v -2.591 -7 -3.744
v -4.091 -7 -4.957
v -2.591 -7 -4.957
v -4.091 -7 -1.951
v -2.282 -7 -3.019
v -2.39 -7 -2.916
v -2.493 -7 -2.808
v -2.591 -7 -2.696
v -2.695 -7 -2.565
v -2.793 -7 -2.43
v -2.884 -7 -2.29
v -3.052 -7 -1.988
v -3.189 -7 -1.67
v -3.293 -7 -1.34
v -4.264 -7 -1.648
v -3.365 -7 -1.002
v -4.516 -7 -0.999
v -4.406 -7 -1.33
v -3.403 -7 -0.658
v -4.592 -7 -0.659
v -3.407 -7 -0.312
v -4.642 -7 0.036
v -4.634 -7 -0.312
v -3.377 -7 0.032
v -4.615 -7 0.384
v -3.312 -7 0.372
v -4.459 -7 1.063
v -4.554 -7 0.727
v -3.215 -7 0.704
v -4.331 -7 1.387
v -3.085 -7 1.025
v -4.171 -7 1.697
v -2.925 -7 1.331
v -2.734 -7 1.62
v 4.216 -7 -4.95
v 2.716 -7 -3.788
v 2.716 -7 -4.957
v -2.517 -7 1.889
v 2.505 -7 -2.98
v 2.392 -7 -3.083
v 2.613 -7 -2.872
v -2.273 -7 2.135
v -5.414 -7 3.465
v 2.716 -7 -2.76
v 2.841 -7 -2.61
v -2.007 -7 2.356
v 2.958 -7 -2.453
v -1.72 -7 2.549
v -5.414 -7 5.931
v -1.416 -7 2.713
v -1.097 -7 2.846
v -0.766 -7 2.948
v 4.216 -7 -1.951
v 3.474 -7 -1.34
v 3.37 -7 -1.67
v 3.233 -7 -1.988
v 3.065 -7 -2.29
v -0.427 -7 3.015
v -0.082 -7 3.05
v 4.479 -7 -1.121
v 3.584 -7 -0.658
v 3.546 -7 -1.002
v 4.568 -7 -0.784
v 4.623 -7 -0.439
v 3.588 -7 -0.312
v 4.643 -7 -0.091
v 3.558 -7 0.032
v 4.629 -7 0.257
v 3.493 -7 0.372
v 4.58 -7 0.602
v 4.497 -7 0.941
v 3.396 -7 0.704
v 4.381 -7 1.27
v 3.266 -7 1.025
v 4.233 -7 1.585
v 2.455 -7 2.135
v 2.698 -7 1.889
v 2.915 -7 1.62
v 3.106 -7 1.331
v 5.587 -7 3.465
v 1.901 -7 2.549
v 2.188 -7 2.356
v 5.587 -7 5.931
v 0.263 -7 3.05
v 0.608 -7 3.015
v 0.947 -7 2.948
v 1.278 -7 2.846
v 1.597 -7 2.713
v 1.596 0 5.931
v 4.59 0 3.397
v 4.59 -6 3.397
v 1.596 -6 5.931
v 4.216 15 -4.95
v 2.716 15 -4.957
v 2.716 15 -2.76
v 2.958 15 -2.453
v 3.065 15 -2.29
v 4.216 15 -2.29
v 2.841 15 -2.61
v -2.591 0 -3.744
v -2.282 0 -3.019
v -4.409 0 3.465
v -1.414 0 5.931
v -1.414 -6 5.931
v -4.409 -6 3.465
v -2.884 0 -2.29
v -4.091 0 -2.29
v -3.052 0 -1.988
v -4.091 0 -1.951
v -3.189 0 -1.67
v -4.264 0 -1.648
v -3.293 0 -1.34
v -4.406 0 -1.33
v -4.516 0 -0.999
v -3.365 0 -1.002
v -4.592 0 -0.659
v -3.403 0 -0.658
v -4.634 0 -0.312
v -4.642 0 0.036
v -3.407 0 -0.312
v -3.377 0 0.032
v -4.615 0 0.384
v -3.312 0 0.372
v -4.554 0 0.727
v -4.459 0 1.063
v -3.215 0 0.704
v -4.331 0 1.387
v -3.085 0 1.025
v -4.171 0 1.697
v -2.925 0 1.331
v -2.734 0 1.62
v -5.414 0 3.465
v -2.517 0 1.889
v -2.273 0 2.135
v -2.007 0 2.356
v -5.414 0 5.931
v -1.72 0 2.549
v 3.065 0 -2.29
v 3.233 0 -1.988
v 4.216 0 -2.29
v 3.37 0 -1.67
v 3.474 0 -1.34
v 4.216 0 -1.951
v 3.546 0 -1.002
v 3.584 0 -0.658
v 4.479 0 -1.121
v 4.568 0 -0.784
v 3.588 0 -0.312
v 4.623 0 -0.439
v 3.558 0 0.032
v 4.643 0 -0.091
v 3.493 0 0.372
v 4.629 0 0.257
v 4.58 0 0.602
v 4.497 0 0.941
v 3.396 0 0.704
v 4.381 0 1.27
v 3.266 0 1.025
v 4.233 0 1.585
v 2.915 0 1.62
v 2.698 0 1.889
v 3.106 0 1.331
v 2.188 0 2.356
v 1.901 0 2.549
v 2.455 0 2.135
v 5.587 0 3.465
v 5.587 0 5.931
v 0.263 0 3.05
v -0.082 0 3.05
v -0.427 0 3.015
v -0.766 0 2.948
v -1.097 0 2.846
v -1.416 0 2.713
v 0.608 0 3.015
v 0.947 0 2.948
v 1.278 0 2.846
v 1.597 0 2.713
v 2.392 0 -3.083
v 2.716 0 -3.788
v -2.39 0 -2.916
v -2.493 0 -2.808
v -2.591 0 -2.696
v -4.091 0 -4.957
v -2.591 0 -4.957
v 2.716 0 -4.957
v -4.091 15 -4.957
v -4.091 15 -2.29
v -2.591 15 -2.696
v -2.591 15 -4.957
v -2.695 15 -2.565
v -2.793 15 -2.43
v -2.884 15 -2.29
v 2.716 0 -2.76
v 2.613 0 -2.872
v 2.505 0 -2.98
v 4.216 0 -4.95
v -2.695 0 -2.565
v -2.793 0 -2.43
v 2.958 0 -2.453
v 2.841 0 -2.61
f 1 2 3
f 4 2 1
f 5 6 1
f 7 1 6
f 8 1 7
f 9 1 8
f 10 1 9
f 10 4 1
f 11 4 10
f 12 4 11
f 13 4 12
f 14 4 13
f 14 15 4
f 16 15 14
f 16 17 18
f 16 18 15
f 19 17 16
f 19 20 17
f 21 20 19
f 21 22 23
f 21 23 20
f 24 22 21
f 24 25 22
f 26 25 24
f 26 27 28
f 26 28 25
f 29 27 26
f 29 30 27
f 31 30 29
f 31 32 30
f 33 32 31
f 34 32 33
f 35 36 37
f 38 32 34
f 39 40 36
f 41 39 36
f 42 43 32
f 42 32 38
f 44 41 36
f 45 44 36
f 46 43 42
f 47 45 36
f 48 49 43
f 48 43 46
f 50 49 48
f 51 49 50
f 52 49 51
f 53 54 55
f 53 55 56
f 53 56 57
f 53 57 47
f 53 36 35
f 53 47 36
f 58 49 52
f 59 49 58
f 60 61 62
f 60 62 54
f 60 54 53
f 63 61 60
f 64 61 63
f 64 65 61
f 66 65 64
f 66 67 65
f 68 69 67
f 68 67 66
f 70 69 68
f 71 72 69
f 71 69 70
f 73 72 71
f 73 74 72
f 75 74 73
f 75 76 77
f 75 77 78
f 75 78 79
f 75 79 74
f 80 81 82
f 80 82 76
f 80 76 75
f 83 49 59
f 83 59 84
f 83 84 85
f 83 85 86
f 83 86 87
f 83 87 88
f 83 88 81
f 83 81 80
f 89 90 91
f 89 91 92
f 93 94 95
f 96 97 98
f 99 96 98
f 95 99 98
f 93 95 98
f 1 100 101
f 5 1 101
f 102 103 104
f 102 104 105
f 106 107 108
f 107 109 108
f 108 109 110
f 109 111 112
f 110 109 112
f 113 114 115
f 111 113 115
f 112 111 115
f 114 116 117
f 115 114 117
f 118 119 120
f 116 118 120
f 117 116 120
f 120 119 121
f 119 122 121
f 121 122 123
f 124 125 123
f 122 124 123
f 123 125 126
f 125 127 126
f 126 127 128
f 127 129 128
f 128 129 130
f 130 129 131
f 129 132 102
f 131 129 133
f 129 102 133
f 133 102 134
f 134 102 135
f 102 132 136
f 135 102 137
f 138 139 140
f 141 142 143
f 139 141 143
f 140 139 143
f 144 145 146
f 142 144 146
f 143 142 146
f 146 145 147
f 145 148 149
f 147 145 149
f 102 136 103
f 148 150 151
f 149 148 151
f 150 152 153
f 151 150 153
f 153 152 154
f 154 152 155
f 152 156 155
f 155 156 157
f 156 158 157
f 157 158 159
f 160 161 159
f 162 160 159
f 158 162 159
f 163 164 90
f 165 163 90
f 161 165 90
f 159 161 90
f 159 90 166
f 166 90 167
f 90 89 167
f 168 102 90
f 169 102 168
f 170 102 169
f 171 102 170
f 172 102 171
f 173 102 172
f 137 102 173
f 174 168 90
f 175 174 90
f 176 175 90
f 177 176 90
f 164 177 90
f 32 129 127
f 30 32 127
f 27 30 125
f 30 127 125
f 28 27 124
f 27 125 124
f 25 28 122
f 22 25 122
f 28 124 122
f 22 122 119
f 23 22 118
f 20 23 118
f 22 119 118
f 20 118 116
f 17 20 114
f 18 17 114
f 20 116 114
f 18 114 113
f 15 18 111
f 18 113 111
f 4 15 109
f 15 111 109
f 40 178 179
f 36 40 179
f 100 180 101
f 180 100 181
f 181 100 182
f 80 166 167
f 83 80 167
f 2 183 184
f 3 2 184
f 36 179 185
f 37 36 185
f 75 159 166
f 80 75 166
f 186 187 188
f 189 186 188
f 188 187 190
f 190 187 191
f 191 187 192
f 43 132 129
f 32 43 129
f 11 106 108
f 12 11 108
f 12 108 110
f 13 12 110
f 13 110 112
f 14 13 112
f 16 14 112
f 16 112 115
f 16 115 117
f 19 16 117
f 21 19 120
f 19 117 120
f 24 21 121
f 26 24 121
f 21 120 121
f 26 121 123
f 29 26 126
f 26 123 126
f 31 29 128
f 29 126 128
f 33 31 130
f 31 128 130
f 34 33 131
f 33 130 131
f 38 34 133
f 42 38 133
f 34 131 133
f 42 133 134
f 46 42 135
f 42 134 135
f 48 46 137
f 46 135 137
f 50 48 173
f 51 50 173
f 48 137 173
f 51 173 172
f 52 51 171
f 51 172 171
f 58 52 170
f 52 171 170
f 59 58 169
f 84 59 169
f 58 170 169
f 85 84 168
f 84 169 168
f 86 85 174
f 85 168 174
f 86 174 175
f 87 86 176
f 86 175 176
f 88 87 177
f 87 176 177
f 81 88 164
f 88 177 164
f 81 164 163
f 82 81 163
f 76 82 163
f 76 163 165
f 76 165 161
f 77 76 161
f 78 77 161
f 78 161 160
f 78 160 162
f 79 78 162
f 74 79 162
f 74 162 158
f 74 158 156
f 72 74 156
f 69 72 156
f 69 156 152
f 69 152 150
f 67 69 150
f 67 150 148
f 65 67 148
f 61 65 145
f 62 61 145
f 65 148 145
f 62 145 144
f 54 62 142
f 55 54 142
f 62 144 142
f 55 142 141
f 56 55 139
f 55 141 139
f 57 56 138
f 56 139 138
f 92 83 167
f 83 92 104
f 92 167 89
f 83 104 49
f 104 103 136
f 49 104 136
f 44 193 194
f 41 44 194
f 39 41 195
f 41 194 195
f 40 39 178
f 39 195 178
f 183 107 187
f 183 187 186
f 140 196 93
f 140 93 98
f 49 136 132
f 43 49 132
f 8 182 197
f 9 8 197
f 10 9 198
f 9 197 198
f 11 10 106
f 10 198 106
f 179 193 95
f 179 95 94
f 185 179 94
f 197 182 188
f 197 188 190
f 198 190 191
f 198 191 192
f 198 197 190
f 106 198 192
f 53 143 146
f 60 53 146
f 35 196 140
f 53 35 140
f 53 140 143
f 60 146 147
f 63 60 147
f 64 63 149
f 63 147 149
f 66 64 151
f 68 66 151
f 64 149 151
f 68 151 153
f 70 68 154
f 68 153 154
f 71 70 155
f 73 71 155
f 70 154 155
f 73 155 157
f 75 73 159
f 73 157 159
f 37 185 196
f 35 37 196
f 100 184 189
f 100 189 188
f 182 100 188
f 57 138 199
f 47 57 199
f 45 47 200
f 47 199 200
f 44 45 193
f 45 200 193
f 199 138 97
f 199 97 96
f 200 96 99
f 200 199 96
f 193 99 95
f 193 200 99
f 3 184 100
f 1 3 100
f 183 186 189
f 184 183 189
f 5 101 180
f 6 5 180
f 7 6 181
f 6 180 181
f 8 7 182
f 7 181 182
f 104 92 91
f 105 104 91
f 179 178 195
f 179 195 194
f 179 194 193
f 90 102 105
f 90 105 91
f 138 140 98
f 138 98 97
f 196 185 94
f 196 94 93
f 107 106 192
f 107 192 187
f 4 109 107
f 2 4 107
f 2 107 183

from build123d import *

# Parameters (mm, degrees)
F1_DEPTH = 7
F2_DEPTH = 6
F3_DEPTH = 15


# Not quite as in the source:
# - a feature names something its author has since deleted; it is built from what else it names


with BuildPart() as f1:
    # F0 (on Front) → F1 (new body)
    with BuildSketch(Plane.XZ):
        with BuildLine():
            Line((-4.090710345, -1.9507641112), (-3.3236176952, -1.6008211246))
            Line((-3.3236176952, -1.6008211246), (-3.3236176952, -2.2903047641))
            Line((-3.3236176952, -2.2903047641), (-2.8842022451, -2.2903047641))
            ThreePointArc((-2.8842022451, -2.2903047641), (0.0905031972, 3.0539098469), (3.0652086395, -2.2903047641))
            Line((3.0652086395, -2.2903047641), (3.4491920394, -2.2903047641))
            Line((3.4491920394, -2.2903047641), (3.4491920394, -1.6408955531))
            Line((3.4491920394, -1.6408955531), (4.2162846892, -1.9507641112))
            Line((4.2162846892, -1.9507641112), (4.4794066601, -1.1210844752))
            ThreePointArc((4.4794066601, -1.1210844752), (4.6290079186, 0.2570213688), (4.2328723206, 1.5854162054))
            Line((4.2328723206, 1.5854162054), (5.5865912817, 3.465253188))
            Line((5.5865912817, 3.465253188), (5.5865912817, 5.931237081))
            Line((5.5865912817, 5.931237081), (1.5955031972, 5.931237081))
            Line((1.5955031972, 5.931237081), (4.5903746292, 3.397220974))
            Line((4.5903746292, 3.397220974), (0.0905031972, 3.431237081))
            Line((0.0905031972, 3.431237081), (-4.4093682348, 3.465253188))
            Line((-4.4093682348, 3.465253188), (-1.4144968028, 5.931237081))
            Line((-1.4144968028, 5.931237081), (-5.4144968028, 5.931237081))
            Line((-5.4144968028, 5.931237081), (-5.4144968028, 3.465253188))
            Line((-5.4144968028, 3.465253188), (-4.1709532845, 1.6969049432))
            ThreePointArc((-4.1709532845, 1.6969049432), (-4.6426172218, -0.138188052), (-4.090710345, -1.9507641112))
        make_face()
        Polygon((-3.3236176952, -2.2903047641), (-3.3236176952, -1.6008211246), (-4.090710345, -1.9507641112), (-4.090710345, -2.2903047641), align=None)
        with BuildLine():
            Line((-2.8842022451, -2.2903047641), (-3.3236176952, -2.2903047641))
            Line((-3.3236176952, -2.2903047641), (-4.090710345, -2.2903047641))
            Line((-4.090710345, -2.2903047641), (-4.090710345, -4.9565606735))
            Line((-4.090710345, -4.9565606735), (-3.3236176952, -4.9565606735))
            Line((-3.3236176952, -4.9565606735), (-2.590710345, -4.9565606735))
            Line((-2.590710345, -4.9565606735), (-2.590710345, -3.7436034497))
            Line((-2.590710345, -3.7436034497), (-2.590710345, -2.6957776739))
            ThreePointArc((-2.590710345, -2.6957776739), (-2.7447140714, -2.4982945873), (-2.8842022451, -2.2903047641))
        make_face()
        with BuildLine():
            Line((3.4491920394, -2.2903047641), (3.0652086395, -2.2903047641))
            ThreePointArc((3.0652086395, -2.2903047641), (2.9005872431, -2.5325770701), (2.7162846892, -2.76023612))
            Line((2.7162846892, -2.76023612), (2.7162846892, -3.7879117456))
            Line((2.7162846892, -3.7879117456), (2.7162846892, -4.9565606735))
            Line((2.7162846892, -4.9565606735), (4.2162846892, -4.9497258588))
            Line((4.2162846892, -4.9497258588), (4.2162846892, -2.2903047641))
            Line((4.2162846892, -2.2903047641), (3.4491920394, -2.2903047641))
        make_face()
        with BuildLine():
            ThreePointArc((-2.2823536237, -3.0189388676), (-2.4416925097, -2.8622823851), (-2.590710345, -2.6957776739))
            Line((-2.590710345, -2.6957776739), (-2.590710345, -3.7436034497))
            Line((-2.590710345, -3.7436034497), (-2.2823536237, -3.0189388676))
        make_face()
        Polygon((3.4491920394, -1.6408955531), (3.4491920394, -2.2903047641), (4.2162846892, -2.2903047641), (4.2162846892, -1.9507641112), align=None)
        with BuildLine():
            Line((2.7162846892, -3.7879117456), (2.7162846892, -2.76023612))
            ThreePointArc((2.7162846892, -2.76023612), (2.5594926434, -2.9268342178), (2.39215173, -3.0828332258))
            Line((2.39215173, -3.0828332258), (2.7162846892, -3.7879117456))
        make_face()
        Polygon((1.5955031972, 5.931237081), (-1.4144968028, 5.931237081), (-4.4093682348, 3.465253188), (0.0905031972, 3.431237081), (4.5903746292, 3.397220974), align=None)
    extrude(amount=F1_DEPTH)

    # F0 (on Front) → F2 (cut)
    with BuildSketch(Plane.XZ):
        Polygon((1.5955031972, 5.931237081), (-1.4144968028, 5.931237081), (-4.4093682348, 3.465253188), (0.0905031972, 3.431237081), (4.5903746292, 3.397220974), align=None)
    extrude(amount=F2_DEPTH, mode=Mode.SUBTRACT)

    # F0 (on Front) → F3 (join)
    with BuildSketch(Plane.XZ):
        with BuildLine():
            Line((-2.8842022451, -2.2903047641), (-3.3236176952, -2.2903047641))
            Line((-3.3236176952, -2.2903047641), (-4.090710345, -2.2903047641))
            Line((-4.090710345, -2.2903047641), (-4.090710345, -4.9565606735))
            Line((-4.090710345, -4.9565606735), (-3.3236176952, -4.9565606735))
            Line((-3.3236176952, -4.9565606735), (-2.590710345, -4.9565606735))
            Line((-2.590710345, -4.9565606735), (-2.590710345, -3.7436034497))
            Line((-2.590710345, -3.7436034497), (-2.590710345, -2.6957776739))
            ThreePointArc((-2.590710345, -2.6957776739), (-2.7447140714, -2.4982945873), (-2.8842022451, -2.2903047641))
        make_face()
        with BuildLine():
            Line((3.4491920394, -2.2903047641), (3.0652086395, -2.2903047641))
            ThreePointArc((3.0652086395, -2.2903047641), (2.9005872431, -2.5325770701), (2.7162846892, -2.76023612))
            Line((2.7162846892, -2.76023612), (2.7162846892, -3.7879117456))
            Line((2.7162846892, -3.7879117456), (2.7162846892, -4.9565606735))
            Line((2.7162846892, -4.9565606735), (4.2162846892, -4.9497258588))
            Line((4.2162846892, -4.9497258588), (4.2162846892, -2.2903047641))
            Line((4.2162846892, -2.2903047641), (3.4491920394, -2.2903047641))
        make_face()
    extrude(amount=-F3_DEPTH)


solid = f1.part
